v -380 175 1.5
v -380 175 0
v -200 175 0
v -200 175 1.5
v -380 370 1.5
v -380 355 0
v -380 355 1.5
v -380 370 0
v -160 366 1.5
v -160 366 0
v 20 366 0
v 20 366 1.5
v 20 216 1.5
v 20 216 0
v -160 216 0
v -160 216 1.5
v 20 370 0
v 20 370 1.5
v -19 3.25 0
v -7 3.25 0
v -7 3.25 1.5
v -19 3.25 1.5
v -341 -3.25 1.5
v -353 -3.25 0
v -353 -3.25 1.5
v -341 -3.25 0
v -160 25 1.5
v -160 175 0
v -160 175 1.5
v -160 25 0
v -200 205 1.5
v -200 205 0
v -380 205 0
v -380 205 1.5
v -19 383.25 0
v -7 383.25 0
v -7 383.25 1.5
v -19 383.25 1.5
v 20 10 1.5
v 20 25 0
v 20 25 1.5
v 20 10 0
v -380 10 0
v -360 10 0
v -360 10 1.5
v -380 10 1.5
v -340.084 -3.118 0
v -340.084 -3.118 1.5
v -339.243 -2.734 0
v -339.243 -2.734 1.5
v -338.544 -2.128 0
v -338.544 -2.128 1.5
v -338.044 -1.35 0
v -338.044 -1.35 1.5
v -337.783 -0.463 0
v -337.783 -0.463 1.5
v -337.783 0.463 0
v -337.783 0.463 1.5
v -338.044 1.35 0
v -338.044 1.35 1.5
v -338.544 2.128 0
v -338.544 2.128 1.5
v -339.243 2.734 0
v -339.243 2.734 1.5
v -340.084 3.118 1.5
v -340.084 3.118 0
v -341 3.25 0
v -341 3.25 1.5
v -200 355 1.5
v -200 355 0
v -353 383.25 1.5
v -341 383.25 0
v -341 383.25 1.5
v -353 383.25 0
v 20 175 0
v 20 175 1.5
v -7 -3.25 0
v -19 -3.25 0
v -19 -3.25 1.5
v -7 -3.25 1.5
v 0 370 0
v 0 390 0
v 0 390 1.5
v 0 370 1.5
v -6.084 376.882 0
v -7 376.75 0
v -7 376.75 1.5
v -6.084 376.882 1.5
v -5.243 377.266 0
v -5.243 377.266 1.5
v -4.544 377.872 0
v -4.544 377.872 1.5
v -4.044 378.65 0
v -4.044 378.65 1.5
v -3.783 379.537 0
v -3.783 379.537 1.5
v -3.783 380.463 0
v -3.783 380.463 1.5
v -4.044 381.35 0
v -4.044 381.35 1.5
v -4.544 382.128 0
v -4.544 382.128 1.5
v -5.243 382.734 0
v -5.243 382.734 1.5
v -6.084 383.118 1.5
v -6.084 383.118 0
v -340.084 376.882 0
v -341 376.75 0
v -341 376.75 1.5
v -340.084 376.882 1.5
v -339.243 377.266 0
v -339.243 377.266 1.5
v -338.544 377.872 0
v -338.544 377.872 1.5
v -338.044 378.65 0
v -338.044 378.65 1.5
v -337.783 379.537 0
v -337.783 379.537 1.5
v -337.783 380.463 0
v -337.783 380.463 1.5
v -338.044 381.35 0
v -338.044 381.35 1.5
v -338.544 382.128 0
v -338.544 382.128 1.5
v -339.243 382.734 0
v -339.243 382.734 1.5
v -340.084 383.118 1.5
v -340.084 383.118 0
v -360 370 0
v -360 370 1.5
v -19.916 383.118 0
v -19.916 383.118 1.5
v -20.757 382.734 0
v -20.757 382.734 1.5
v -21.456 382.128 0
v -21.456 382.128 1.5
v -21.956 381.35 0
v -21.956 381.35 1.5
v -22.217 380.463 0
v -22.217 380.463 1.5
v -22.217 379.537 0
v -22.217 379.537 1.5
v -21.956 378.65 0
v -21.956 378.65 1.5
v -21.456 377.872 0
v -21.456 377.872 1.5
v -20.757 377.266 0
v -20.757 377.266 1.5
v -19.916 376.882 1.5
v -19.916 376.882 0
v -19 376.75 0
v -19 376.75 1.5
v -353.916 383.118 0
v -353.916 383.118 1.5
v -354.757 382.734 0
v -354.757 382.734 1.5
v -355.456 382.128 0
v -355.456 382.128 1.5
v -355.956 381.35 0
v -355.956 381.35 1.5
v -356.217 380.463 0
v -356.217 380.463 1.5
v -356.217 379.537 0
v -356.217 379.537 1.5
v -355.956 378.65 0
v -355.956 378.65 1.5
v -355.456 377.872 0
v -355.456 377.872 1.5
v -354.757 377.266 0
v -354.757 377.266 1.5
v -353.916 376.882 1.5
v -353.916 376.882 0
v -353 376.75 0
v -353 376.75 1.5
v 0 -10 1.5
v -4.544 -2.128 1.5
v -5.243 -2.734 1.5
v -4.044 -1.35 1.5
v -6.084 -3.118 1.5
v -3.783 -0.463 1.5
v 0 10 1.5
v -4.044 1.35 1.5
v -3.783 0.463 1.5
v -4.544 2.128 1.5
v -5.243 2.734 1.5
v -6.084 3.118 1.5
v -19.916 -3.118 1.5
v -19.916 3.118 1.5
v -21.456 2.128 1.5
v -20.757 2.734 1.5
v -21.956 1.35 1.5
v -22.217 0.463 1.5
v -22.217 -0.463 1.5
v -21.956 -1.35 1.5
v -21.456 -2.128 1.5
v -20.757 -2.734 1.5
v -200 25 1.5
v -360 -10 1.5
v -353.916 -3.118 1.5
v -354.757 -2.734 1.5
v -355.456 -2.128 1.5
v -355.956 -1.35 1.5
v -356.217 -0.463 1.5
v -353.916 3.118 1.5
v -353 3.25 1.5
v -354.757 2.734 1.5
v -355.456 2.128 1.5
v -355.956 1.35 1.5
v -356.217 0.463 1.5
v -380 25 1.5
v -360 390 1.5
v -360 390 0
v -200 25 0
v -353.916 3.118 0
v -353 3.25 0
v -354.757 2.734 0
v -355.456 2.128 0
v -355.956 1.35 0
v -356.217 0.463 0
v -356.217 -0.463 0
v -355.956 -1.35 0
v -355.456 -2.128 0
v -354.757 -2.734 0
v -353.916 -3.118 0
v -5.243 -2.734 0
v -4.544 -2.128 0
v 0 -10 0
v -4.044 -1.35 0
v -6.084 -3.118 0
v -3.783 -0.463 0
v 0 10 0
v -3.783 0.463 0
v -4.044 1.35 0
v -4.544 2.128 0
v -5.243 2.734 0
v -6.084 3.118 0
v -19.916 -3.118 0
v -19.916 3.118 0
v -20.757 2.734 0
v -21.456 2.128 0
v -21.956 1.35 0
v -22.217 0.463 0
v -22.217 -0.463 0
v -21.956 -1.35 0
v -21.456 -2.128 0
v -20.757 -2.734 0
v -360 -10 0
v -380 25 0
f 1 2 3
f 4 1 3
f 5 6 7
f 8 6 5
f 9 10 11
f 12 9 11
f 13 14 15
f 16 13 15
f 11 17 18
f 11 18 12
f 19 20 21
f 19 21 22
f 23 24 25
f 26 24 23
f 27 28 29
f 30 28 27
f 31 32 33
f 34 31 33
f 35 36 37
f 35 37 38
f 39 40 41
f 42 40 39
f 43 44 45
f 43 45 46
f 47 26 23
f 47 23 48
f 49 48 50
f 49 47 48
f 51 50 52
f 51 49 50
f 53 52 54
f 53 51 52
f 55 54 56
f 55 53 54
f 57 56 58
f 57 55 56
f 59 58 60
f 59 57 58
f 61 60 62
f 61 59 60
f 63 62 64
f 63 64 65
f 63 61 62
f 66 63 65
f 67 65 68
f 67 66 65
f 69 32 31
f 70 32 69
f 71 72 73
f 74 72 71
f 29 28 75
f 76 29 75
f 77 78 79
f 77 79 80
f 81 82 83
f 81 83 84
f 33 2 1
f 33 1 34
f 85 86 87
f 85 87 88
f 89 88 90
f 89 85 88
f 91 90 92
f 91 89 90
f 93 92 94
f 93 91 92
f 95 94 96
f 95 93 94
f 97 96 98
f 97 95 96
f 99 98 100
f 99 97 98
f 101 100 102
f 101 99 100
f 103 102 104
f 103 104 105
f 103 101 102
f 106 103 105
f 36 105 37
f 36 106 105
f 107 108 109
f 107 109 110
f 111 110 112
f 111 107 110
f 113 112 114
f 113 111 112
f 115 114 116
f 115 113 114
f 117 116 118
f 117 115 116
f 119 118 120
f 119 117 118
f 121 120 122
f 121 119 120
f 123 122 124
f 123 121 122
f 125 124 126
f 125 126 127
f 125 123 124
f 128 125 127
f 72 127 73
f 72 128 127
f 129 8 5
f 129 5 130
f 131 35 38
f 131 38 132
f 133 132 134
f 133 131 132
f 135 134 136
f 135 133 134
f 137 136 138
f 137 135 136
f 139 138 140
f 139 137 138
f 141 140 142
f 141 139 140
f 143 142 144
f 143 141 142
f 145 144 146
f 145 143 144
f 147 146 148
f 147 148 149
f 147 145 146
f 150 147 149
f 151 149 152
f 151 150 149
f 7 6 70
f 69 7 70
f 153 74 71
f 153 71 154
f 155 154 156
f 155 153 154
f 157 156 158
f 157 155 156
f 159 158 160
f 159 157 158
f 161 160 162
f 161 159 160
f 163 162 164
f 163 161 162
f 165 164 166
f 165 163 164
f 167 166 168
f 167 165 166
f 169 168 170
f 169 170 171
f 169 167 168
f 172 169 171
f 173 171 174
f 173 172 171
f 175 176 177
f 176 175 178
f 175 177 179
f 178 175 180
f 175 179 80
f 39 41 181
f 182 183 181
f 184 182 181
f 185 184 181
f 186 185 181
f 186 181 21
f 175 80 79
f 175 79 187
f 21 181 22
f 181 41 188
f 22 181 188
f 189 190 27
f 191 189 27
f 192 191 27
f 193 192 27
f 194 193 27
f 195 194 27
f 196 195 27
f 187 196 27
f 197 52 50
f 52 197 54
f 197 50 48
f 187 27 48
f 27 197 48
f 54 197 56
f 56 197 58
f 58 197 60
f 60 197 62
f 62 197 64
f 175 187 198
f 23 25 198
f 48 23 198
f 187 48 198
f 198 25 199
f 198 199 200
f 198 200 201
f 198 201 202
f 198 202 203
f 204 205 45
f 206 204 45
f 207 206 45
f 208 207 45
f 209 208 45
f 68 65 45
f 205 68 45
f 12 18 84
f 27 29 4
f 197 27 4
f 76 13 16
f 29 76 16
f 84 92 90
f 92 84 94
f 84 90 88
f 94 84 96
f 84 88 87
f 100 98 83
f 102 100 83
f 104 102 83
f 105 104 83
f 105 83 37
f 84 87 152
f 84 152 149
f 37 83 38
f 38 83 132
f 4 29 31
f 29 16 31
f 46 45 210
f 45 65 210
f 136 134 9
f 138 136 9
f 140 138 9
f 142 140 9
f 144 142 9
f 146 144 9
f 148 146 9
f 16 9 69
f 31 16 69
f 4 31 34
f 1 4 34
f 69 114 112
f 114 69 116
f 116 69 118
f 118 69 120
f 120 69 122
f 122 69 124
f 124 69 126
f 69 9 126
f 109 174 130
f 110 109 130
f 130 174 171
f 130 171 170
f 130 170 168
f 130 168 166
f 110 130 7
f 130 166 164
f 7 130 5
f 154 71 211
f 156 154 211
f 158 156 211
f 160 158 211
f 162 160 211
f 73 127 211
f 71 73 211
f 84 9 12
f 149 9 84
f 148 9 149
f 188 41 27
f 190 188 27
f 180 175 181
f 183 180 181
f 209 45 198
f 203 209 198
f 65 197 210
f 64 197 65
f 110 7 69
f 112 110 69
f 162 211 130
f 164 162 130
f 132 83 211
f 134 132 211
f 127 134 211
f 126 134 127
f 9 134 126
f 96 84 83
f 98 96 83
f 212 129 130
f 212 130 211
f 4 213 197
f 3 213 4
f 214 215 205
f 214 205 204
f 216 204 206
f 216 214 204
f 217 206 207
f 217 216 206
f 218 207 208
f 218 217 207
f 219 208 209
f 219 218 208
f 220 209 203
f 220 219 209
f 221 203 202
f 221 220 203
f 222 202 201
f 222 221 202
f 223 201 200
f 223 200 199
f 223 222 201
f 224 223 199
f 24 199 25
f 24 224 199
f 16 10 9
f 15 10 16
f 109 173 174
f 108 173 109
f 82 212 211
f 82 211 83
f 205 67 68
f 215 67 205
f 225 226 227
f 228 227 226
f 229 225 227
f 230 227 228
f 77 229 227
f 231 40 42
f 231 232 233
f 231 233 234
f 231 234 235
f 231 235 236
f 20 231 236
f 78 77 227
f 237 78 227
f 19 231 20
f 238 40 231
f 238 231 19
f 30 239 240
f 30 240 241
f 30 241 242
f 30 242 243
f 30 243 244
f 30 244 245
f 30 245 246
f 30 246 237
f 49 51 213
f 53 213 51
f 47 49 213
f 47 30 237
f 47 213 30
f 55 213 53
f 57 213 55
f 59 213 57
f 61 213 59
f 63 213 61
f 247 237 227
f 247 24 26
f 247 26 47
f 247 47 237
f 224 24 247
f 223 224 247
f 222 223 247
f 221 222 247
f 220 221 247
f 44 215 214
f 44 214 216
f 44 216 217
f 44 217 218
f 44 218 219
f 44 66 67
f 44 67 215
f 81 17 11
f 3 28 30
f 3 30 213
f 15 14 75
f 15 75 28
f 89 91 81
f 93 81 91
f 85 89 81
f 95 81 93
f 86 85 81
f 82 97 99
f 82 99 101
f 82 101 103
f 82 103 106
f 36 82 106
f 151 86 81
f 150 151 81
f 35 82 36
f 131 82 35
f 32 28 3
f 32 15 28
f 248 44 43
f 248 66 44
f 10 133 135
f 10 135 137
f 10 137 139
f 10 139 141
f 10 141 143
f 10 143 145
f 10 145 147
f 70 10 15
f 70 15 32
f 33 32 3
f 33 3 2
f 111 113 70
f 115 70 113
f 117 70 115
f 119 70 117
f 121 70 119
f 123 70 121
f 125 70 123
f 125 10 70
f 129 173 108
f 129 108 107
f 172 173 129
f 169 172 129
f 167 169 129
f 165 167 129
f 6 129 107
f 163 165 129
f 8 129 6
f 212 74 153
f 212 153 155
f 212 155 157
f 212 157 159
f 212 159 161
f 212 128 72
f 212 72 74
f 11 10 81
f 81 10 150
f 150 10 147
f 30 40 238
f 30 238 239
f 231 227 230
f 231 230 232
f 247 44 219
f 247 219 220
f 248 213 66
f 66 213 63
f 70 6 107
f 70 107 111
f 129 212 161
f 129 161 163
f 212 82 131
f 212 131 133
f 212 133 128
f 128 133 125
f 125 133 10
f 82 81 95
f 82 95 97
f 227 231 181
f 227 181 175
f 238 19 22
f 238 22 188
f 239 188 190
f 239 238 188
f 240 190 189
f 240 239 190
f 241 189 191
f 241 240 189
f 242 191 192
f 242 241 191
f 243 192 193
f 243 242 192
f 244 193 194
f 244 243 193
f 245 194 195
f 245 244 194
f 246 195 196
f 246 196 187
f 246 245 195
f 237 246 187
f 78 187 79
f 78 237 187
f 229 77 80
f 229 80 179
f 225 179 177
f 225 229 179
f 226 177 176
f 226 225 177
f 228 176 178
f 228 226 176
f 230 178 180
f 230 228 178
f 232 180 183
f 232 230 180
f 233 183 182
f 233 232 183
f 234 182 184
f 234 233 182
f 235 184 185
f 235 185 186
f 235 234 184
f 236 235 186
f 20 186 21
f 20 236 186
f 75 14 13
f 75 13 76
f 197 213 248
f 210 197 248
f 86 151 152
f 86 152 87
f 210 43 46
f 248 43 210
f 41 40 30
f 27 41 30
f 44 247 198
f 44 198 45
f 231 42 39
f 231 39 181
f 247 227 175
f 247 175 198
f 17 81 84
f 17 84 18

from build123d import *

# Parameters (mm, degrees)
EXTRUDE_1_DEPTH = 1.5


with BuildPart() as part:
    # 草图1 → 凸台-拉伸1 (new body)
    with BuildSketch(Plane.XY):
        Polygon((-10, 366), (-160, 366), (-160, 216), (-10, 216), (20, 216), (20, 175), (-10, 175), (-160, 175), (-160, 25), (-10, 25), (20, 25), (20, 10), (0, 10), (0, -10), (-360, -10), (-360, 10), (-380, 10), (-380, 25), (-350, 25), (-200, 25), (-200, 175), (-350, 175), (-380, 175), (-380, 205), (-350, 205), (-200, 205), (-200, 355), (-350, 355), (-380, 355), (-380, 370), (-360, 370), (-360, 390), (0, 390), (0, 370), (20, 370), (20, 366), align=None)
        with BuildLine():
            Line((-353, -3.25), (-341, -3.25))
            ThreePointArc((-341, -3.25), (-337.75, 0), (-341, 3.25))
            Line((-341, 3.25), (-353, 3.25))
            ThreePointArc((-353, 3.25), (-356.25, 0), (-353, -3.25))
        make_face(mode=Mode.SUBTRACT)
        with BuildLine():
            Line((-19, -3.25), (-7, -3.25))
            ThreePointArc((-7, -3.25), (-3.75, 0), (-7, 3.25))
            Line((-7, 3.25), (-19, 3.25))
            ThreePointArc((-19, 3.25), (-22.25, 0), (-19, -3.25))
        make_face(mode=Mode.SUBTRACT)
        with BuildLine():
            Line((-19, 376.75), (-7, 376.75))
            ThreePointArc((-7, 376.75), (-3.75, 380), (-7, 383.25))
            Line((-7, 383.25), (-19, 383.25))
            ThreePointArc((-19, 383.25), (-22.25, 380), (-19, 376.75))
        make_face(mode=Mode.SUBTRACT)
        with BuildLine():
            Line((-353, 376.75), (-341, 376.75))
            ThreePointArc((-341, 376.75), (-337.75, 380), (-341, 383.25))
            Line((-341, 383.25), (-353, 383.25))
            ThreePointArc((-353, 383.25), (-356.25, 380), (-353, 376.75))
        make_face(mode=Mode.SUBTRACT)
    extrude(amount=EXTRUDE_1_DEPTH)


solid = part.part
